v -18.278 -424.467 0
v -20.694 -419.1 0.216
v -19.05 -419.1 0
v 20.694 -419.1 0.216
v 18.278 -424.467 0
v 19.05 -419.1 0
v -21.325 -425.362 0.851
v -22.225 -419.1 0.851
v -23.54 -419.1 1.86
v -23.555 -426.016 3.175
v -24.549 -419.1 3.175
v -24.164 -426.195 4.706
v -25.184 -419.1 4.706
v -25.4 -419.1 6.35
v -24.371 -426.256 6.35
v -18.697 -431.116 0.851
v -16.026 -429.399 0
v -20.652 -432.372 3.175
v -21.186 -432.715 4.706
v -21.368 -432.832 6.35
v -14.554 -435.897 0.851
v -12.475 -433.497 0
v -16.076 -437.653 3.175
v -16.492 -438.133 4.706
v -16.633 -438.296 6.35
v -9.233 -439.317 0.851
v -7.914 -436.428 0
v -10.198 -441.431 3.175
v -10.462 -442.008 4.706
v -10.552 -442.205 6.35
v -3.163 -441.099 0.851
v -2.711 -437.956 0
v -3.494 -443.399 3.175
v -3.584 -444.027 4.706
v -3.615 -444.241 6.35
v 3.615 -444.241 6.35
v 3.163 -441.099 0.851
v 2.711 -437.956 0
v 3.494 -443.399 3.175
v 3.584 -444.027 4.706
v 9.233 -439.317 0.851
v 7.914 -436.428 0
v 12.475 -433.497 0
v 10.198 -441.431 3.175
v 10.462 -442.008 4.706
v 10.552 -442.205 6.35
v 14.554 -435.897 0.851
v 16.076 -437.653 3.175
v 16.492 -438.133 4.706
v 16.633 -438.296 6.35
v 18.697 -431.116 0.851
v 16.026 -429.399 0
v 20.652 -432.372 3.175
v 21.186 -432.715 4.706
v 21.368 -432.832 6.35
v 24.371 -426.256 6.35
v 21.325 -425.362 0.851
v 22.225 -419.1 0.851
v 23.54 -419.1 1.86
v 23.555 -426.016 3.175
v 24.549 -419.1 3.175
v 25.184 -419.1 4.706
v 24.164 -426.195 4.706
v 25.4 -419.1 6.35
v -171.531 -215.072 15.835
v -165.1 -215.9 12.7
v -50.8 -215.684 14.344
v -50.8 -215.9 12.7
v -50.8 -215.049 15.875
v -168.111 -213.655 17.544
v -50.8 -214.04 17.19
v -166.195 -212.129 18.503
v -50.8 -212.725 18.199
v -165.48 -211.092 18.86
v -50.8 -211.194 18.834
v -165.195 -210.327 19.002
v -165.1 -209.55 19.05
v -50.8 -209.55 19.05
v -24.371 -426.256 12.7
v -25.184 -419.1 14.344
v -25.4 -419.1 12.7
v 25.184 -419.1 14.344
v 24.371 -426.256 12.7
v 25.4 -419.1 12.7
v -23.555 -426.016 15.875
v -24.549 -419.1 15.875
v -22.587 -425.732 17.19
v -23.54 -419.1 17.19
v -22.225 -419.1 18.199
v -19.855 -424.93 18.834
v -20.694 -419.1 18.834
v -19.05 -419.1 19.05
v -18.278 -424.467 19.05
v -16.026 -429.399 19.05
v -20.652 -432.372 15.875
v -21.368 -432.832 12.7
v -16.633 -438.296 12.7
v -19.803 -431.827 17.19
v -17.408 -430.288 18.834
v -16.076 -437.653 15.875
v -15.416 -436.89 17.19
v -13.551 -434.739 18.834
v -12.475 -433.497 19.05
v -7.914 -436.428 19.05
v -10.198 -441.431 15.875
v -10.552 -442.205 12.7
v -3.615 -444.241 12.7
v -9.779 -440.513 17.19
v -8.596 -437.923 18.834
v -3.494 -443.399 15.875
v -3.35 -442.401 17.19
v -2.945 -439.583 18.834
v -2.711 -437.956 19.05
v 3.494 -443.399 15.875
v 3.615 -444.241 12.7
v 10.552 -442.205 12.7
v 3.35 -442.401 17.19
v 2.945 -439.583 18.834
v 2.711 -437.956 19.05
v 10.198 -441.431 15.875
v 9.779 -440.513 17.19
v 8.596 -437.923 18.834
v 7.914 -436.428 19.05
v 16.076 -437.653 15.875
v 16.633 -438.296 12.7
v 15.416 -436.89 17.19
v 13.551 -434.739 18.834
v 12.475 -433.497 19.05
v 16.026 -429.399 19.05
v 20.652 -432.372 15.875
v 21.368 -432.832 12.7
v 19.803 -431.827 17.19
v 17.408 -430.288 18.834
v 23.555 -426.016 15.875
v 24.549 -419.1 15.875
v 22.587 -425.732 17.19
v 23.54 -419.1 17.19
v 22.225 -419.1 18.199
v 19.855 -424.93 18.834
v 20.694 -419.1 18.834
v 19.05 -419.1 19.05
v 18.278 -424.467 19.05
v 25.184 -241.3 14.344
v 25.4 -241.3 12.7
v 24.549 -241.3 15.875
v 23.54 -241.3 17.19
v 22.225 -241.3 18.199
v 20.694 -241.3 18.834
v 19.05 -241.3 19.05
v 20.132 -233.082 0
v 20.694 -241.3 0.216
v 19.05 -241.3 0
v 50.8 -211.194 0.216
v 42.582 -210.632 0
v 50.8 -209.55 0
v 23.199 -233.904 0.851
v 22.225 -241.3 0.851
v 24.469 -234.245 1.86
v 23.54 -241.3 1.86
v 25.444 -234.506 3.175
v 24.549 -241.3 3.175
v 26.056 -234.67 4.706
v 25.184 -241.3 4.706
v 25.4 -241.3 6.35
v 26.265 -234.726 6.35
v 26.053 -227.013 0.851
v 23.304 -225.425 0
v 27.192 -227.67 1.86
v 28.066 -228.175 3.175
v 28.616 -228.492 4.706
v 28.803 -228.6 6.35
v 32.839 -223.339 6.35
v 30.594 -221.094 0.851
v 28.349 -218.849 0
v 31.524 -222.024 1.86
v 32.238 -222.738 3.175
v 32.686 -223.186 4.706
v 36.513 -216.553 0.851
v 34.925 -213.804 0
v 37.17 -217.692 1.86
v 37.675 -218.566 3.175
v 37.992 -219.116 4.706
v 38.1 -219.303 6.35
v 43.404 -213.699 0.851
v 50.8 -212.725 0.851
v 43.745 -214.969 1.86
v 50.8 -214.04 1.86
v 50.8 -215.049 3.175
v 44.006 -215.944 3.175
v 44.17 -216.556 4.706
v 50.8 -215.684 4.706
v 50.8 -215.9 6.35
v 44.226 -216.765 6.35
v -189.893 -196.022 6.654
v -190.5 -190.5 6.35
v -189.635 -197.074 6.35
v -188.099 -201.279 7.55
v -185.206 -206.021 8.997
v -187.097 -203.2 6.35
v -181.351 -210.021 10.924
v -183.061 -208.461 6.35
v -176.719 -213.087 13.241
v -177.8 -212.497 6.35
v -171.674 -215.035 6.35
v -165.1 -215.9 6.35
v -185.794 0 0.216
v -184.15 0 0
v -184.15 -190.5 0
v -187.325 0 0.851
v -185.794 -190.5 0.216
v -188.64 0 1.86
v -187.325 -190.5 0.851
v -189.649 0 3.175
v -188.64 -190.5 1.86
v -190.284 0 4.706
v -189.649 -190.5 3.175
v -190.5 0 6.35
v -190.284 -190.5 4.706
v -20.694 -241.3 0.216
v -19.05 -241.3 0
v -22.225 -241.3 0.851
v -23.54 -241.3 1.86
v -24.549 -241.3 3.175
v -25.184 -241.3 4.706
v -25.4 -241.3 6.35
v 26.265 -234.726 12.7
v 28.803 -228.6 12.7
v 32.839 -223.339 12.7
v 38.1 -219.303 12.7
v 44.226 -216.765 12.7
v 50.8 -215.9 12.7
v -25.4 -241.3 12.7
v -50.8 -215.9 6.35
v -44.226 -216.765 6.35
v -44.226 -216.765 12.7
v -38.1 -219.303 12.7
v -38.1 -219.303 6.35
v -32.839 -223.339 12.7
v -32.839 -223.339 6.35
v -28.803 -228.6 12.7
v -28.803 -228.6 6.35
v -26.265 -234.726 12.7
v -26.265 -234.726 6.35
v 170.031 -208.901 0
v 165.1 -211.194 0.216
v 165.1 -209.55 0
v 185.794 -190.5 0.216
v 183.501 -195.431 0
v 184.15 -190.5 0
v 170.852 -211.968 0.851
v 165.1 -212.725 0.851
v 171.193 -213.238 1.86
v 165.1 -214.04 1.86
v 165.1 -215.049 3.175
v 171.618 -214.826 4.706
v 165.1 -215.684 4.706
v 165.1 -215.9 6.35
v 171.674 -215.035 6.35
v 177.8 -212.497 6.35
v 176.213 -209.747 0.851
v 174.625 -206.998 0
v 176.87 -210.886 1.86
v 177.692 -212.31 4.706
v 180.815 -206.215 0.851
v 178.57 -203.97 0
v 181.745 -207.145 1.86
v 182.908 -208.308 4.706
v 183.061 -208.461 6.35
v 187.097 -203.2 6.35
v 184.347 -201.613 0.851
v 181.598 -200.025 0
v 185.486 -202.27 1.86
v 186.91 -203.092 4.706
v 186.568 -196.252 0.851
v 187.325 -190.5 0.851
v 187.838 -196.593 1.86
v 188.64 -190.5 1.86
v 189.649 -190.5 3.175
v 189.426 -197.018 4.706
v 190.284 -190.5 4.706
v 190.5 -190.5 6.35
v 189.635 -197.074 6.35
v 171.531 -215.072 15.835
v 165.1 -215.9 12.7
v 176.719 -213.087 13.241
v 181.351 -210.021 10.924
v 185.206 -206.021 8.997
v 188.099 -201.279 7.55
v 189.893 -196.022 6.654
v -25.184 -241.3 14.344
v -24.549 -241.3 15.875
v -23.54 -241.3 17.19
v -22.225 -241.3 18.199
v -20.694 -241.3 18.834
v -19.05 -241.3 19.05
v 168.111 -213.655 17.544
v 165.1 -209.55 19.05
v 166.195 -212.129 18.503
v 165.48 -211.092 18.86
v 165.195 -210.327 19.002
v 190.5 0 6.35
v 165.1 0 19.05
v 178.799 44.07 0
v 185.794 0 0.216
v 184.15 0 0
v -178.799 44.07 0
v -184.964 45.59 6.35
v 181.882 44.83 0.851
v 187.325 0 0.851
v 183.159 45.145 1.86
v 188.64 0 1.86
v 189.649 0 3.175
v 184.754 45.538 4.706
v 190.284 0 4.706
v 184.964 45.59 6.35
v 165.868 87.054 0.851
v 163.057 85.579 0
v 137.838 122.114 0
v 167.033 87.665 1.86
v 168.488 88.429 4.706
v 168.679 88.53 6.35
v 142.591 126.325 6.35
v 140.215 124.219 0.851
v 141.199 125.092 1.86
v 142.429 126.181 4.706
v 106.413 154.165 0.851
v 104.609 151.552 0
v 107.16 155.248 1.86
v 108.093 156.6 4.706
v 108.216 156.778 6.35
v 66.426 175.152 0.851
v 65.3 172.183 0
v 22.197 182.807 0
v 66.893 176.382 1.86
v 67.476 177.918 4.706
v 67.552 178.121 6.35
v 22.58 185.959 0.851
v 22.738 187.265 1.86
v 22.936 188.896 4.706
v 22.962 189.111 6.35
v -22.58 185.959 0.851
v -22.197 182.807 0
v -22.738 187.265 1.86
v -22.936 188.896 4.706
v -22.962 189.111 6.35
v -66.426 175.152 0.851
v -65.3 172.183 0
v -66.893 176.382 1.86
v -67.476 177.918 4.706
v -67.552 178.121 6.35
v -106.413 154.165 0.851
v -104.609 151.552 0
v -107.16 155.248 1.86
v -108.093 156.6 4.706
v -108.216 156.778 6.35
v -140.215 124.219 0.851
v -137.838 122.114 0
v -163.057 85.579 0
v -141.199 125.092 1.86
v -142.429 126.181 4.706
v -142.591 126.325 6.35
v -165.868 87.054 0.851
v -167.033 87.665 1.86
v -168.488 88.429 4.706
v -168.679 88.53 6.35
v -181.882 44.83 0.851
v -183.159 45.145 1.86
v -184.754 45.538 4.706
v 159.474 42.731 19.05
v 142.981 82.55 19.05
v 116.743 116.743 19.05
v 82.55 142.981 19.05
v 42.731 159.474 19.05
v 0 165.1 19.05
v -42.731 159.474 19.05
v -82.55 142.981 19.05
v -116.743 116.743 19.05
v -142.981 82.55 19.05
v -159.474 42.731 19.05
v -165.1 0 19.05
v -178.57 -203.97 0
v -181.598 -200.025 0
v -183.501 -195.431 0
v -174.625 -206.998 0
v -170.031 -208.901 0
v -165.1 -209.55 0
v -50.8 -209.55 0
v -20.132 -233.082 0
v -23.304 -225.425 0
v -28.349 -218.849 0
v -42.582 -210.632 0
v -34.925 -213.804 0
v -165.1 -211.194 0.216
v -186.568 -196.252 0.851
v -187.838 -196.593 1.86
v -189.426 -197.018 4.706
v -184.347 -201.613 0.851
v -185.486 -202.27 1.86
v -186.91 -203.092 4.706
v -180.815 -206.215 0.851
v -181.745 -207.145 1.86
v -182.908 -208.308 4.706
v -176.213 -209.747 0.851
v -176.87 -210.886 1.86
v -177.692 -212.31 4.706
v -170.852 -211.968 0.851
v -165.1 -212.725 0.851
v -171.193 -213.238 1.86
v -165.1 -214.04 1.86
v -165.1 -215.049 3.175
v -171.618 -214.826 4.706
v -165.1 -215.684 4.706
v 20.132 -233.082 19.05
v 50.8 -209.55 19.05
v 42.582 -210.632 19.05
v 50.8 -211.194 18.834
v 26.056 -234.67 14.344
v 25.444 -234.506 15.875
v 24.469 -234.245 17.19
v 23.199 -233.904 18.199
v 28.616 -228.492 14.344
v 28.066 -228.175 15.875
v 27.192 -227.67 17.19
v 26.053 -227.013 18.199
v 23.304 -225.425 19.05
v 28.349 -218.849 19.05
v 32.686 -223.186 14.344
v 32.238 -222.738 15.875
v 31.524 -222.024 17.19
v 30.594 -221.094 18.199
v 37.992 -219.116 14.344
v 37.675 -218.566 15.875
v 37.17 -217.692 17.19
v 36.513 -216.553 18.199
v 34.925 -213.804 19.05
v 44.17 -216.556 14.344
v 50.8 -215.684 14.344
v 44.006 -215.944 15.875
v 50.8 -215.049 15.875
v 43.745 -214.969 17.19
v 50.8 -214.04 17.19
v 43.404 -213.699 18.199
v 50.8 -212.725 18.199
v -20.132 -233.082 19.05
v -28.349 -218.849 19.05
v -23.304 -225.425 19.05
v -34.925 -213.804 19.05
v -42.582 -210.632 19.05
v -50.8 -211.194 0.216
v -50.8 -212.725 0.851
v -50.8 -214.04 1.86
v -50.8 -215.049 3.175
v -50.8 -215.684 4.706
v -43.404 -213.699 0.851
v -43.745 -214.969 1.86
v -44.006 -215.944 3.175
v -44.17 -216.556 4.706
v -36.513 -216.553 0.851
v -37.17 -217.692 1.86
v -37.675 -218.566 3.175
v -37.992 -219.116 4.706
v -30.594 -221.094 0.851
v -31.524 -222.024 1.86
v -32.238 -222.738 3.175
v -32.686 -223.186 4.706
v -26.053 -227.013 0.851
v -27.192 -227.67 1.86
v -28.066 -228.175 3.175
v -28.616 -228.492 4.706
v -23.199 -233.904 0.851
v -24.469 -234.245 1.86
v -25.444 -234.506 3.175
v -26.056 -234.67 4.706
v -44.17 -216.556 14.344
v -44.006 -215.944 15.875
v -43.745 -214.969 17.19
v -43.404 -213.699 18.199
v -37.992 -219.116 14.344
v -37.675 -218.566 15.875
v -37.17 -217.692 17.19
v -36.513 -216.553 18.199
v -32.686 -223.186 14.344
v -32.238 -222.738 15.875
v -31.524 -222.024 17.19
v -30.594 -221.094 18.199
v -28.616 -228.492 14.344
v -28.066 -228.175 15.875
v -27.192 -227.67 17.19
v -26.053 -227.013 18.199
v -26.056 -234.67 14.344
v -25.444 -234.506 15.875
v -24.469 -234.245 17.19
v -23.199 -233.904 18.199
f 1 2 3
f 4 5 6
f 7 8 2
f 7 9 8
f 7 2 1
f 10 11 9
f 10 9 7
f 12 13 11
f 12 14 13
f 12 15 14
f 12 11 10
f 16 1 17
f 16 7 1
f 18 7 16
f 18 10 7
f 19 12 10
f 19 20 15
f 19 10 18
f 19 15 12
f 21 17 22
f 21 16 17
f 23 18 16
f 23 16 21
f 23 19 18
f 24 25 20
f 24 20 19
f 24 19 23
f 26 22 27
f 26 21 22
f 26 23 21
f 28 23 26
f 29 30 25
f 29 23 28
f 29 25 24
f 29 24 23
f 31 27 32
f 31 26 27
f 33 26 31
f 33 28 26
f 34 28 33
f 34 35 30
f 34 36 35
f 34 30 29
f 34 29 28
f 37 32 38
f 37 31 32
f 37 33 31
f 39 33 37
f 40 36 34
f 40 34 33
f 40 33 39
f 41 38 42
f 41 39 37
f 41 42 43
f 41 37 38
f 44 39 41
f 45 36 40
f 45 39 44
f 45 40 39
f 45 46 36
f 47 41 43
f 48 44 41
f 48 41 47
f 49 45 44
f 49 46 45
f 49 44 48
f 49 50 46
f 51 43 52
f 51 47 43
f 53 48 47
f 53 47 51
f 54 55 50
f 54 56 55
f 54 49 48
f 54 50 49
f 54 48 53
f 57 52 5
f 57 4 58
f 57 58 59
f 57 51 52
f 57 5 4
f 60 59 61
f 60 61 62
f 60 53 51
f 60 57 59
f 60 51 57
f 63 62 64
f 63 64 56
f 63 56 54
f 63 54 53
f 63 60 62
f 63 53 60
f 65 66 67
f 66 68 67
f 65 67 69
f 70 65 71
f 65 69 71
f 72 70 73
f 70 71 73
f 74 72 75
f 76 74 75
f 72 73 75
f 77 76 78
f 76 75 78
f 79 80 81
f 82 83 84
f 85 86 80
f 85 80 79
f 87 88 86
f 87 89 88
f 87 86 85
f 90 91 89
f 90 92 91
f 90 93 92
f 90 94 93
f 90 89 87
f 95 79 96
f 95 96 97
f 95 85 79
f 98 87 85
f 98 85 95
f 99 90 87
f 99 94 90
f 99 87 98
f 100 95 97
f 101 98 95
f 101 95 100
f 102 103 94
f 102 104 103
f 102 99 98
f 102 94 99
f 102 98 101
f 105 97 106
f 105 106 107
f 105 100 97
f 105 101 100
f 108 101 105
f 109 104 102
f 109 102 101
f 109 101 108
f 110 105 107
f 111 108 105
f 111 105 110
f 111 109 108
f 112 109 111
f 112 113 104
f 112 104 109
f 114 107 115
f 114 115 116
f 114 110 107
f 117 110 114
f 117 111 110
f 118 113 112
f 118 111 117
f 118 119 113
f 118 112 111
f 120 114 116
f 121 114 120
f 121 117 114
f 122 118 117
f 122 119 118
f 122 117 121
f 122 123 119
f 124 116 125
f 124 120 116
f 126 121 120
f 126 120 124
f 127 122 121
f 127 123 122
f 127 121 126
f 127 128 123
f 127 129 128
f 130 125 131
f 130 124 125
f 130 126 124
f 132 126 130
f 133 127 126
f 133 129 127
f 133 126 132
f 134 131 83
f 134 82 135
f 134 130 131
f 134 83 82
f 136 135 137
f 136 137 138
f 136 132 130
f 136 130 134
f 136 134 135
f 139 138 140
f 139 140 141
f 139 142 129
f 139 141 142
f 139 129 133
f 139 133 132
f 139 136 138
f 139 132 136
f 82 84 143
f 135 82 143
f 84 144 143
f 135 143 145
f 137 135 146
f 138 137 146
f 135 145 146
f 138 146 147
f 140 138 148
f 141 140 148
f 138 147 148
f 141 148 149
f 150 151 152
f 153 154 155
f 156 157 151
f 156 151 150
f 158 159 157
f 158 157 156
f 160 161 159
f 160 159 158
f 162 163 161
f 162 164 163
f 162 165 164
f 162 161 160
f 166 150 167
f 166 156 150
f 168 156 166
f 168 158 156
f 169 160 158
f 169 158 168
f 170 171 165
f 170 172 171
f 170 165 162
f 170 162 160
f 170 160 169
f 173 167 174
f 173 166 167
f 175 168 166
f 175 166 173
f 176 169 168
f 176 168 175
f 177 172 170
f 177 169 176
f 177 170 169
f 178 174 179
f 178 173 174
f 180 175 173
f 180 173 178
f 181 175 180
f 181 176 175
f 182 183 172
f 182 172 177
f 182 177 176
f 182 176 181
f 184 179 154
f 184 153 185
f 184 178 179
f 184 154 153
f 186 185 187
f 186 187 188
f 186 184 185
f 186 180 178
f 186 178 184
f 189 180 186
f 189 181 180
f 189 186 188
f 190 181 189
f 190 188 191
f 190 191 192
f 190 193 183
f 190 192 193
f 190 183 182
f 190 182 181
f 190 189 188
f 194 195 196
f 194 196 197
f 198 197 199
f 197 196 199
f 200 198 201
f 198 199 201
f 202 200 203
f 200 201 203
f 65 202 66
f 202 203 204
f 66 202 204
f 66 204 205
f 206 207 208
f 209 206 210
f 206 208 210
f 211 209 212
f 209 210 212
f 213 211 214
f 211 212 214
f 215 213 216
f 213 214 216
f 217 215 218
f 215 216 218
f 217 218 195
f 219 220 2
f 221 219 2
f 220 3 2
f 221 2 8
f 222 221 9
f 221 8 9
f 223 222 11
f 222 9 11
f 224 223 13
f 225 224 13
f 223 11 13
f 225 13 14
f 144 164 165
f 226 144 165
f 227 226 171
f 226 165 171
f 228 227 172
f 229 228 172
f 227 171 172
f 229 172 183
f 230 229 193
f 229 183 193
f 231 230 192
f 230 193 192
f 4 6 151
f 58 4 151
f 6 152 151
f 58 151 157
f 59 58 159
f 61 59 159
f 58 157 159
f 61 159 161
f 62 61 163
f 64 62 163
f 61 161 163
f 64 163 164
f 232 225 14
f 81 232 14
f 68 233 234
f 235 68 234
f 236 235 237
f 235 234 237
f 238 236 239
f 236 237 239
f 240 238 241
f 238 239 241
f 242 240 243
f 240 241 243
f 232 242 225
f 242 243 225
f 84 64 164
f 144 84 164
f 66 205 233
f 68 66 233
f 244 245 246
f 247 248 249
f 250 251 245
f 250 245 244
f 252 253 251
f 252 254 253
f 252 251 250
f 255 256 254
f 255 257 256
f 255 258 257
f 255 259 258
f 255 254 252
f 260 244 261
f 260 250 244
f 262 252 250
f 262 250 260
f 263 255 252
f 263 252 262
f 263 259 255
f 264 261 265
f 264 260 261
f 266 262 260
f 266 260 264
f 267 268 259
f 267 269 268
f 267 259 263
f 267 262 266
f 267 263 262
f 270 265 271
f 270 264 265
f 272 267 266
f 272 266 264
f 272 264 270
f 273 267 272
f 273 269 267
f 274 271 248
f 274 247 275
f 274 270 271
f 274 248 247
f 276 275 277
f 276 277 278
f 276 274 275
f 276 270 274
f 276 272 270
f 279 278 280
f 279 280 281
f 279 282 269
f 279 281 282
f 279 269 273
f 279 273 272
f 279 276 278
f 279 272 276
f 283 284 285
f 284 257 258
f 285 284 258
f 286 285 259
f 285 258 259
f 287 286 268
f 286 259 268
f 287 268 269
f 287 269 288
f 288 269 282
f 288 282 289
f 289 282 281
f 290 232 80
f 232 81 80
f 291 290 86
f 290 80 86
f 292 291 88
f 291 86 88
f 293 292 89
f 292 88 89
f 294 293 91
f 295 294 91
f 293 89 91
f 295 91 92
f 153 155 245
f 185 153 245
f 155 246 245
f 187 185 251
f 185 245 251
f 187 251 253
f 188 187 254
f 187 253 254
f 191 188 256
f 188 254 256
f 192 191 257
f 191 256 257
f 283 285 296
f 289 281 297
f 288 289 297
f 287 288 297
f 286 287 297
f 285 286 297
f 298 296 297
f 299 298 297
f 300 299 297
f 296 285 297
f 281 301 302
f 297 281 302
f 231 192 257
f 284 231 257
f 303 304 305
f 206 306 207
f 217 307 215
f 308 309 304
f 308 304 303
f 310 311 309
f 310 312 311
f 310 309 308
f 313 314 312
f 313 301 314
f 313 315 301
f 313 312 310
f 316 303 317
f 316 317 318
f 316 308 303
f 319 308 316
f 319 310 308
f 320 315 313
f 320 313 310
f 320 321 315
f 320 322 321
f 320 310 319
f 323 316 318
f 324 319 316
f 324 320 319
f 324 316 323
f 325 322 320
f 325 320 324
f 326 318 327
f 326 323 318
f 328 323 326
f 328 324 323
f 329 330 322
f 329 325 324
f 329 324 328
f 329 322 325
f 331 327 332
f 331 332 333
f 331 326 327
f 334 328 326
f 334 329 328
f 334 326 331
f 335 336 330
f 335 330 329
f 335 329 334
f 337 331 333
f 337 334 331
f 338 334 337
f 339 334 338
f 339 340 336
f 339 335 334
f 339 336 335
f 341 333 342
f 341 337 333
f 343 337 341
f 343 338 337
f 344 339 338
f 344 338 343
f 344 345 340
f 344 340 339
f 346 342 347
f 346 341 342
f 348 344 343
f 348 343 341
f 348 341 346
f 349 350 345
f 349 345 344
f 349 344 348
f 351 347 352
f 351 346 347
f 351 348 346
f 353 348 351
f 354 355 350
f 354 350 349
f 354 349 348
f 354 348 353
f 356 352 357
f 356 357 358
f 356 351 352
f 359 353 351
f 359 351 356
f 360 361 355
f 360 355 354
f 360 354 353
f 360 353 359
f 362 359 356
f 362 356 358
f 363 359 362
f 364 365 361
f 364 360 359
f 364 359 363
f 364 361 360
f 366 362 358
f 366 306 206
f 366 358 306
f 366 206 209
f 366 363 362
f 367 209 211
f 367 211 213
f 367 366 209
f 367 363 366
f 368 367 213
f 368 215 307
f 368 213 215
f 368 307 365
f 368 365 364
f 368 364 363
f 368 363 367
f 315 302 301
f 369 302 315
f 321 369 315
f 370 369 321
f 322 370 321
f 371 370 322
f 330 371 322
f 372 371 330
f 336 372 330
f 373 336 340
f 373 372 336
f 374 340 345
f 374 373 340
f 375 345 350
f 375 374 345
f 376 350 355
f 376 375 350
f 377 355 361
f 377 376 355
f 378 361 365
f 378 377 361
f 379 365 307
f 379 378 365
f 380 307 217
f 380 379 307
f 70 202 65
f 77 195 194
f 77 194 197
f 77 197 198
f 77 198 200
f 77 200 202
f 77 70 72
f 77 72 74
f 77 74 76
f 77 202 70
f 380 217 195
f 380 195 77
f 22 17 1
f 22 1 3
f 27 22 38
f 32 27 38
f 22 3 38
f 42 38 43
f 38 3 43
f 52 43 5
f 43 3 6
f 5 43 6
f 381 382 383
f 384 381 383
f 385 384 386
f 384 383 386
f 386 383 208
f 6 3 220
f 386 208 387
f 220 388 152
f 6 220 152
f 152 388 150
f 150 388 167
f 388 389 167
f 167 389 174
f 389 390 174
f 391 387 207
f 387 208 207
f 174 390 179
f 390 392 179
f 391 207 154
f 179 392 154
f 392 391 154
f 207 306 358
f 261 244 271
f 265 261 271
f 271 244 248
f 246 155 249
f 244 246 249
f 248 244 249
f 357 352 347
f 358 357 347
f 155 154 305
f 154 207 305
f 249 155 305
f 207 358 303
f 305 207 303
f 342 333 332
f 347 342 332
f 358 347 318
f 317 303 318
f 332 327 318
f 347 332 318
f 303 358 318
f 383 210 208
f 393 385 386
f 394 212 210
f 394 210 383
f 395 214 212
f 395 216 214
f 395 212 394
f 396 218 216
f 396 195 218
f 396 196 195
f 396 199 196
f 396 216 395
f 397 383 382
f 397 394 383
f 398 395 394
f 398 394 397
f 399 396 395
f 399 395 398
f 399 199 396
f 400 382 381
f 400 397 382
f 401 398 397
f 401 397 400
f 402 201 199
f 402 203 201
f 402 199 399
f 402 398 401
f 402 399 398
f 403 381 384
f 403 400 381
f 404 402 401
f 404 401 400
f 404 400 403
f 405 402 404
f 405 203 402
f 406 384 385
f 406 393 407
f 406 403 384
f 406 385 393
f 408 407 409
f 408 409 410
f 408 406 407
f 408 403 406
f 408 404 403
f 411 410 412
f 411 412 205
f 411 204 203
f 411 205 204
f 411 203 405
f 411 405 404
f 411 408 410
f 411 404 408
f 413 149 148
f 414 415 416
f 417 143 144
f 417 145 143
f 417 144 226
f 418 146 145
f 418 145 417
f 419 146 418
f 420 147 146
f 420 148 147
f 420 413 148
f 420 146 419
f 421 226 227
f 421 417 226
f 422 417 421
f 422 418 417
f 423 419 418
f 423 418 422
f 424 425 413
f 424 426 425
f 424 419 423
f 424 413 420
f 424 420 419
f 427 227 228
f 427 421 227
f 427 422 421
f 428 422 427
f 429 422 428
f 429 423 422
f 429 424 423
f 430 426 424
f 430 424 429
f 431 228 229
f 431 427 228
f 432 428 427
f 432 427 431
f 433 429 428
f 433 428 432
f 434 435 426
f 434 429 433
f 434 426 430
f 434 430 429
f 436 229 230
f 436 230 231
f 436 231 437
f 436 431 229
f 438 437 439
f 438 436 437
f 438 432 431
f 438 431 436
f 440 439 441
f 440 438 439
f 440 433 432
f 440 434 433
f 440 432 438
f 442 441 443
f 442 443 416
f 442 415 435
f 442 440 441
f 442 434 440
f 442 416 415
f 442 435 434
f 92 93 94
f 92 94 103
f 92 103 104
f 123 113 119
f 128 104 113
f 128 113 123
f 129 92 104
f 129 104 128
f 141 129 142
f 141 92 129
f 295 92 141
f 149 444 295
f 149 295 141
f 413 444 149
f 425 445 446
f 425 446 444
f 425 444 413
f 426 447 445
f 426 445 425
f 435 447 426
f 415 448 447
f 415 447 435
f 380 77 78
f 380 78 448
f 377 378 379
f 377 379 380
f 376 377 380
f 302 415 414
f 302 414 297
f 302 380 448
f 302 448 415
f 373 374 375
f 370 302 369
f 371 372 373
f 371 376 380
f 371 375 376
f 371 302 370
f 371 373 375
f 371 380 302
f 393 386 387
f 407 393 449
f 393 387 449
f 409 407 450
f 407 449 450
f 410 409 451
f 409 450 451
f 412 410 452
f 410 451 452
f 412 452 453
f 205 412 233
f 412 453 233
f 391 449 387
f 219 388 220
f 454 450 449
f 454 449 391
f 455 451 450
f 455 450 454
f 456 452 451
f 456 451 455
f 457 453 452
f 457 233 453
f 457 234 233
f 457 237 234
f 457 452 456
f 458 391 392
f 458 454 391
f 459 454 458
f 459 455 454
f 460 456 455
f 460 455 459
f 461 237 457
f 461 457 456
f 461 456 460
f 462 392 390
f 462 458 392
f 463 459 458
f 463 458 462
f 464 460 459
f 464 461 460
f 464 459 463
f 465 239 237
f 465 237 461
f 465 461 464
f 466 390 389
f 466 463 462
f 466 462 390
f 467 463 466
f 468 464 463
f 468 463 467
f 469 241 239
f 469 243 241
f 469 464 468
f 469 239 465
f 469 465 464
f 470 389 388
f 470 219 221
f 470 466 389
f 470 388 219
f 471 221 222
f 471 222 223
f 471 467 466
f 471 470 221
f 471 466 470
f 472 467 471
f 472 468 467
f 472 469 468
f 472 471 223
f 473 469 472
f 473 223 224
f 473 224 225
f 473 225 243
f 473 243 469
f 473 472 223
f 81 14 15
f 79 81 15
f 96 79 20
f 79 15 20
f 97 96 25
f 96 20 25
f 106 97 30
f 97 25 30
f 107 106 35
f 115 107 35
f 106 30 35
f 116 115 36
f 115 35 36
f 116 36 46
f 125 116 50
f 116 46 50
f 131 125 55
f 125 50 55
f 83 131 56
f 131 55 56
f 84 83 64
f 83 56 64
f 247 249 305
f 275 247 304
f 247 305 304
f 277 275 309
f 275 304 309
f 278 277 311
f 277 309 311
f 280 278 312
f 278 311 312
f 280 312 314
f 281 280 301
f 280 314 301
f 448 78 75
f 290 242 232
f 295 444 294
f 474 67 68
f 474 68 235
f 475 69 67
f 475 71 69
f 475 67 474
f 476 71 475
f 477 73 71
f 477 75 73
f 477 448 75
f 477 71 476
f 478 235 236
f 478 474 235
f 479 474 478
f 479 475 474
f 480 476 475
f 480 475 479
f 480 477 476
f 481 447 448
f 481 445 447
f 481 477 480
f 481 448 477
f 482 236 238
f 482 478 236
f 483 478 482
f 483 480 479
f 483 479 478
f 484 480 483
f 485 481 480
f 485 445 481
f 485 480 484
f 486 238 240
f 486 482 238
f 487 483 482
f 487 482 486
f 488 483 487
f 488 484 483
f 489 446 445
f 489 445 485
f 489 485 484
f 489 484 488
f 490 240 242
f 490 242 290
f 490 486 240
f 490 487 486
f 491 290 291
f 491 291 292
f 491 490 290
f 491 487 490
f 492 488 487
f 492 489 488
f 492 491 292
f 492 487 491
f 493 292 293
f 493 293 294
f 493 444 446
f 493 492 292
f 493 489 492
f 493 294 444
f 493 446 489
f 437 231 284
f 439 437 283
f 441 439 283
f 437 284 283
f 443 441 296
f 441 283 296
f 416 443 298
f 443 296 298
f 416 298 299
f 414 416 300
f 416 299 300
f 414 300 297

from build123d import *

# Parameters (mm, degrees)
F1_DEPTH    = 19.05
F2_T1_DEPTH = 256.2816533942
F2_T4_ANGLE = 180
F3_R        = 6.35
F4_R        = 6.34999


# Not quite as in the source:
# - a fillet or chamfer that OpenCascade refuses, or shapes differently, is made with other operations: its cross-section is extruded or revolved along the edge and cut away or added
# - a fillet or chamfer is up to 0.001 mm smaller than in the source, because OpenCascade refuses the exact size


with BuildPart() as f1:
    # F0 (on Top) → F1 (new body)
    with BuildSketch(Plane.XY):
        with BuildLine():
            Line((190.5, -190.5), (190.5, 0))
            ThreePointArc((190.5, 0), (0, 190.5), (-190.5, 0))
            Line((-190.5, 0), (-190.5, -190.5))
            ThreePointArc((-190.5, -190.5), (-183.0605122421, -208.4605122421), (-165.1, -215.9))
            Line((-165.1, -215.9), (-50.8, -215.9))
            ThreePointArc((-50.8, -215.9), (-32.8394877579, -223.3394877579), (-25.4, -241.3))
            Line((-25.4, -241.3), (-25.4, -419.1))
            ThreePointArc((-25.4, -419.1), (0, -444.5), (25.4, -419.1))
            Line((25.4, -419.1), (25.4, -241.3))
            ThreePointArc((25.4, -241.3), (32.8394877579, -223.3394877579), (50.8, -215.9))
            Line((50.8, -215.9), (165.1, -215.9))
            ThreePointArc((165.1, -215.9), (183.0605122421, -208.4605122421), (190.5, -190.5))
        make_face()
    extrude(amount=F1_DEPTH)

    # F2: chamfer of 12.7 x 25.4 on 3 edges, made by hand

    # F2_s2 → F2_t1 (cut)
    with BuildSketch(Plane.XZ):
        Polygon((-190.5, 6.35), (-165.1, 19.05), (-190.5, 19.05), align=None)
        Polygon((190.5, 6.35), (165.1, 19.05), (190.5, 19.05), align=None)
    extrude(amount=F2_T1_DEPTH, mode=Mode.SUBTRACT)

    # F2_s3 → F2_t4 (revolve, cut)
    with BuildSketch(Plane.XZ):
        Polygon((190.5, 6.35), (165.1, 19.05), (190.5, 19.05), align=None)
    revolve(axis=Axis((0, 0, 19.05), (0, 0, 1)), revolution_arc=F2_T4_ANGLE, mode=Mode.SUBTRACT)

    # F3
    f3_edges = [f1.edges().sort_by_distance(p)[0] for p in [
        (0, -444.5, 19.05),
    ]]
    fillet(f3_edges, radius=F3_R)

    # F4 (radius 6.35 in the source; OpenCascade refuses exactly that, so slightly less here)
    f4_edges = [f1.edges().sort_by_distance(p)[0] for p in [
        (25.4, -330.2, 0),
        (32.839488, -223.339488, 0),
        (107.95, -215.9, 0),
        (183.060512, -208.460512, 0),
        (190.5, -95.25, 0),
        (0, 190.5, 0),
        (-190.5, -95.25, 0),
        (-183.060512, -208.460512, 0),
        (-107.95, -215.9, 0),
        (-32.839488, -223.339488, 0),
        (-25.4, -330.2, 0),
        (0, -444.5, 0),
    ]]
    fillet(f4_edges, radius=F4_R)


solid = f1.part
